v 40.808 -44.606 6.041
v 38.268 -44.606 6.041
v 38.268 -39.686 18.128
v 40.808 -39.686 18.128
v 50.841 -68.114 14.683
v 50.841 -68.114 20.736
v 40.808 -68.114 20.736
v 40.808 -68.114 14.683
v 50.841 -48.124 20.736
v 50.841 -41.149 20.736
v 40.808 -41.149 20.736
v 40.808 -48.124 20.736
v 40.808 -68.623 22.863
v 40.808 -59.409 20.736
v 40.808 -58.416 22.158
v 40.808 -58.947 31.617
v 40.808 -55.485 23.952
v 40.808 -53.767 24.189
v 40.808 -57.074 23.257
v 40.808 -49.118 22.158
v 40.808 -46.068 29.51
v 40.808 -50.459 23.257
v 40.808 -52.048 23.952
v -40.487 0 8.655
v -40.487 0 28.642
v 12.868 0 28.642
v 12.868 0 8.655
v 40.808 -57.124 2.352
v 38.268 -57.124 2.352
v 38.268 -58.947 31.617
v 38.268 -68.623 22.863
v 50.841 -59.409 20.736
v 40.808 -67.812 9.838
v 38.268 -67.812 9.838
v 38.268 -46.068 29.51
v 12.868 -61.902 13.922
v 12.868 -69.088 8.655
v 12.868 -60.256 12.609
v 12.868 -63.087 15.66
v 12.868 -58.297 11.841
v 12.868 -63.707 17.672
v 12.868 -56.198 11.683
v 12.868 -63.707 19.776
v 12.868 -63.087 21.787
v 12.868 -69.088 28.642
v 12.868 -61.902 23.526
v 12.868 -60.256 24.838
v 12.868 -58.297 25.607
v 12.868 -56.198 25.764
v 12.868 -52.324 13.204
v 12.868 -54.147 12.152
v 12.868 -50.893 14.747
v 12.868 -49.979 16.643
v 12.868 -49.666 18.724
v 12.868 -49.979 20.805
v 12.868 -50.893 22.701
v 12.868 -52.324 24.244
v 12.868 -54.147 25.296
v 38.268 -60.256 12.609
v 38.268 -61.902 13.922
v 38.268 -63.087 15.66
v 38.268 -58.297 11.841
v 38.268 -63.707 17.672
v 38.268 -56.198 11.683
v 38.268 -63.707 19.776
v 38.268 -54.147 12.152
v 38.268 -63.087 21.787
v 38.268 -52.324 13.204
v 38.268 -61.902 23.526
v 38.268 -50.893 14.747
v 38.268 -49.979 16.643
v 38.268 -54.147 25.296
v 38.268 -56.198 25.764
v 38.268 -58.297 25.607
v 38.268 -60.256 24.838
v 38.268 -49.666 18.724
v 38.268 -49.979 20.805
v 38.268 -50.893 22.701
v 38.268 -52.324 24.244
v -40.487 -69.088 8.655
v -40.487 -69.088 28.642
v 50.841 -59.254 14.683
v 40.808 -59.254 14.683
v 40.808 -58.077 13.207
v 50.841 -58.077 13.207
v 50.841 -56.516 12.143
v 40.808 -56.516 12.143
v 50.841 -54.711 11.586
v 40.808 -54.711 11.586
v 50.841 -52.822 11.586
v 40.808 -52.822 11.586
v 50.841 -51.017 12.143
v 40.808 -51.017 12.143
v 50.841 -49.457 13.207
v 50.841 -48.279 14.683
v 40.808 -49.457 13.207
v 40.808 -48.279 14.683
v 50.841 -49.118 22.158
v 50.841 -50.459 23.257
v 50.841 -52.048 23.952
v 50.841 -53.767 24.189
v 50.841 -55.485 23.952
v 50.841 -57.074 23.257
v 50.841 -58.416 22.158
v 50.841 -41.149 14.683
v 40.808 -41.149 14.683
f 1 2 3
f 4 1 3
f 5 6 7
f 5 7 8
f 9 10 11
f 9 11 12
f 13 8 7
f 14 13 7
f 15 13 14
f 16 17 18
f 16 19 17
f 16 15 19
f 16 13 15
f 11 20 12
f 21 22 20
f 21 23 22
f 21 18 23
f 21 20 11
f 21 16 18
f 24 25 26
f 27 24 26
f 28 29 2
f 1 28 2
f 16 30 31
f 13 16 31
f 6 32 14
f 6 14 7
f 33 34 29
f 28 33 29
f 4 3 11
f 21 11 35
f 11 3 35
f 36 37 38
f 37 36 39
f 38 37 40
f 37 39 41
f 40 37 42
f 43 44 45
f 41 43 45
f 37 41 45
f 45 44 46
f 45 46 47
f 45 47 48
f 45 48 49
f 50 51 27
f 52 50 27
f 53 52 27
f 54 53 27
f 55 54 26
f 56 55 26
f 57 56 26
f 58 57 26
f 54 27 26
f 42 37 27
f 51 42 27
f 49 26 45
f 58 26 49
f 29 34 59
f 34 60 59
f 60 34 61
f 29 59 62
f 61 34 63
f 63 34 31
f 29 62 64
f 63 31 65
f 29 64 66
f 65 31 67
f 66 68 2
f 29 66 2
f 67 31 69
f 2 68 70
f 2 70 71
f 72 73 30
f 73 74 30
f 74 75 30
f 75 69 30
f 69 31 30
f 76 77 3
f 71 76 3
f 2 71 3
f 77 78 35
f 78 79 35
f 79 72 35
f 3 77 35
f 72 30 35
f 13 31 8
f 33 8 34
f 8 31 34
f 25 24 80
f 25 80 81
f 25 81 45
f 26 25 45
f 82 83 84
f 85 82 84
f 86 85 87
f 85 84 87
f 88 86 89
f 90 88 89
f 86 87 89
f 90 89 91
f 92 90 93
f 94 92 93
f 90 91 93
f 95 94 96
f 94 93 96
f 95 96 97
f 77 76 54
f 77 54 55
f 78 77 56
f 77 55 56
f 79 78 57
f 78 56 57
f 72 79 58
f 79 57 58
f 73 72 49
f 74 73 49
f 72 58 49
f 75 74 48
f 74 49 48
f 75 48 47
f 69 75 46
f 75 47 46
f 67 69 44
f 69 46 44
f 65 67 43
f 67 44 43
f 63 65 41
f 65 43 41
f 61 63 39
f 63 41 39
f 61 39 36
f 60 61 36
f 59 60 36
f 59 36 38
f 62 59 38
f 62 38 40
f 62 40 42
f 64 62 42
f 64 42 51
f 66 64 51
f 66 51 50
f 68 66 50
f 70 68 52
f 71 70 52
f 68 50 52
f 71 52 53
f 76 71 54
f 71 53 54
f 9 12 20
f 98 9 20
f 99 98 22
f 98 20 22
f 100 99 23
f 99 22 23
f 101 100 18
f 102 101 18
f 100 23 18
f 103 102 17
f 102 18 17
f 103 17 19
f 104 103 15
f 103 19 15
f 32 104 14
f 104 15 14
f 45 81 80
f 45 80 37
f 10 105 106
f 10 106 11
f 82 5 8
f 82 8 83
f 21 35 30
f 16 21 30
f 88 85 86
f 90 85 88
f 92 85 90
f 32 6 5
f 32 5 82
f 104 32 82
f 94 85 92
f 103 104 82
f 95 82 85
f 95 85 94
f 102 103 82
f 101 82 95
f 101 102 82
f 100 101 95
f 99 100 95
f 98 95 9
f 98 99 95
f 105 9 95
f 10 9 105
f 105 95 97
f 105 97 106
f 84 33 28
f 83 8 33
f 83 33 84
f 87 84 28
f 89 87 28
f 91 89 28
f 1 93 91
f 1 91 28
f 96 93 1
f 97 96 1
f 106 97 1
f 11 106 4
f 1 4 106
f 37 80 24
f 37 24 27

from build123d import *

# Parameters (mm, degrees)
F0_W     = 53.3547988161
F0_H     = 19.9866779149
F1_DEPTH = 69.088
F2_R     = 7.0602732338
F3_DEPTH = 25.4
F5_DEPTH = 2.54
F7_DEPTH = 10.033


with BuildPart() as f1:
    # F0 (on Front) → F1 (new body)
    with BuildSketch(Plane.XZ):
        with Locations((-13.8097074814, 18.6486560851)):
            Rectangle(F0_W, F0_H)
    extrude(amount=F1_DEPTH)

    # F2 (on face) → F3 (join)
    with BuildSketch(Plane.YZ.offset(12.8676919267)):
        with Locations((-56.7260272801, 18.7238119543)):
            Circle(F2_R)
    extrude(amount=F3_DEPTH)

    # F4 (on face) → F5 (join)
    with BuildSketch(Plane.YZ.offset(38.2676919267)):
        Polygon((-46.0683374544, 29.5102504033), (-58.9465306262, 31.6174495083), (-68.6234273353, 22.8626898016), (-67.812126987, 9.838483907), (-57.123555291, 2.3523245085), (-44.6064247416, 6.041442323), (-39.6863899454, 18.1278563919), align=None)
    extrude(amount=F5_DEPTH)

    # F6 (on face) → F7 (join)
    with BuildSketch(Plane.YZ.offset(40.8076919267)):
        with BuildLine():
            ThreePointArc((-59.2542665191, 14.6833357248), (-53.7665337324, 11.5151886184), (-48.2788009457, 14.6833357248))
            Line((-48.2788009457, 14.6833357248), (-59.2542665191, 14.6833357248))
        make_face()
        with BuildLine():
            ThreePointArc((-48.1241693804, 20.7364859485), (-47.6057251813, 19.3354981023), (-47.4296488155, 17.8520735353))
            ThreePointArc((-47.4296488155, 17.8520735353), (-47.6456170701, 16.211802319), (-48.2788009457, 14.6833357248))
            Line((-48.2788009457, 14.6833357248), (-41.1490116824, 14.6833357248))
            Line((-41.1490116824, 14.6833357248), (-41.1490116824, 20.7364859485))
            Line((-41.1490116824, 20.7364859485), (-48.1241693804, 20.7364859485))
        make_face()
        with BuildLine():
            ThreePointArc((-59.2542665191, 14.6833357248), (-60.1013520003, 17.690246581), (-59.4088980844, 20.7364859485))
            Line((-59.4088980844, 20.7364859485), (-68.1139211999, 20.7364859485))
            Line((-68.1139211999, 20.7364859485), (-68.1139211999, 14.6833357248))
            Line((-68.1139211999, 14.6833357248), (-59.2542665191, 14.6833357248))
        make_face()
        with BuildLine():
            Line((-59.4088980844, 20.7364859485), (-48.1241693804, 20.7364859485))
            ThreePointArc((-48.1241693804, 20.7364859485), (-53.7665337324, 24.1889584522), (-59.4088980844, 20.7364859485))
        make_face()
        with BuildLine():
            ThreePointArc((-48.2788009457, 14.6833357248), (-47.6456170701, 16.211802319), (-47.4296488155, 17.8520735353))
            ThreePointArc((-47.4296488155, 17.8520735353), (-47.6057251813, 19.3354981023), (-48.1241693804, 20.7364859485))
            Line((-48.1241693804, 20.7364859485), (-59.4088980844, 20.7364859485))
            ThreePointArc((-59.4088980844, 20.7364859485), (-60.1013520003, 17.690246581), (-59.2542665191, 14.6833357248))
            Line((-59.2542665191, 14.6833357248), (-48.2788009457, 14.6833357248))
        make_face()
    extrude(amount=F7_DEPTH)


solid = f1.part
